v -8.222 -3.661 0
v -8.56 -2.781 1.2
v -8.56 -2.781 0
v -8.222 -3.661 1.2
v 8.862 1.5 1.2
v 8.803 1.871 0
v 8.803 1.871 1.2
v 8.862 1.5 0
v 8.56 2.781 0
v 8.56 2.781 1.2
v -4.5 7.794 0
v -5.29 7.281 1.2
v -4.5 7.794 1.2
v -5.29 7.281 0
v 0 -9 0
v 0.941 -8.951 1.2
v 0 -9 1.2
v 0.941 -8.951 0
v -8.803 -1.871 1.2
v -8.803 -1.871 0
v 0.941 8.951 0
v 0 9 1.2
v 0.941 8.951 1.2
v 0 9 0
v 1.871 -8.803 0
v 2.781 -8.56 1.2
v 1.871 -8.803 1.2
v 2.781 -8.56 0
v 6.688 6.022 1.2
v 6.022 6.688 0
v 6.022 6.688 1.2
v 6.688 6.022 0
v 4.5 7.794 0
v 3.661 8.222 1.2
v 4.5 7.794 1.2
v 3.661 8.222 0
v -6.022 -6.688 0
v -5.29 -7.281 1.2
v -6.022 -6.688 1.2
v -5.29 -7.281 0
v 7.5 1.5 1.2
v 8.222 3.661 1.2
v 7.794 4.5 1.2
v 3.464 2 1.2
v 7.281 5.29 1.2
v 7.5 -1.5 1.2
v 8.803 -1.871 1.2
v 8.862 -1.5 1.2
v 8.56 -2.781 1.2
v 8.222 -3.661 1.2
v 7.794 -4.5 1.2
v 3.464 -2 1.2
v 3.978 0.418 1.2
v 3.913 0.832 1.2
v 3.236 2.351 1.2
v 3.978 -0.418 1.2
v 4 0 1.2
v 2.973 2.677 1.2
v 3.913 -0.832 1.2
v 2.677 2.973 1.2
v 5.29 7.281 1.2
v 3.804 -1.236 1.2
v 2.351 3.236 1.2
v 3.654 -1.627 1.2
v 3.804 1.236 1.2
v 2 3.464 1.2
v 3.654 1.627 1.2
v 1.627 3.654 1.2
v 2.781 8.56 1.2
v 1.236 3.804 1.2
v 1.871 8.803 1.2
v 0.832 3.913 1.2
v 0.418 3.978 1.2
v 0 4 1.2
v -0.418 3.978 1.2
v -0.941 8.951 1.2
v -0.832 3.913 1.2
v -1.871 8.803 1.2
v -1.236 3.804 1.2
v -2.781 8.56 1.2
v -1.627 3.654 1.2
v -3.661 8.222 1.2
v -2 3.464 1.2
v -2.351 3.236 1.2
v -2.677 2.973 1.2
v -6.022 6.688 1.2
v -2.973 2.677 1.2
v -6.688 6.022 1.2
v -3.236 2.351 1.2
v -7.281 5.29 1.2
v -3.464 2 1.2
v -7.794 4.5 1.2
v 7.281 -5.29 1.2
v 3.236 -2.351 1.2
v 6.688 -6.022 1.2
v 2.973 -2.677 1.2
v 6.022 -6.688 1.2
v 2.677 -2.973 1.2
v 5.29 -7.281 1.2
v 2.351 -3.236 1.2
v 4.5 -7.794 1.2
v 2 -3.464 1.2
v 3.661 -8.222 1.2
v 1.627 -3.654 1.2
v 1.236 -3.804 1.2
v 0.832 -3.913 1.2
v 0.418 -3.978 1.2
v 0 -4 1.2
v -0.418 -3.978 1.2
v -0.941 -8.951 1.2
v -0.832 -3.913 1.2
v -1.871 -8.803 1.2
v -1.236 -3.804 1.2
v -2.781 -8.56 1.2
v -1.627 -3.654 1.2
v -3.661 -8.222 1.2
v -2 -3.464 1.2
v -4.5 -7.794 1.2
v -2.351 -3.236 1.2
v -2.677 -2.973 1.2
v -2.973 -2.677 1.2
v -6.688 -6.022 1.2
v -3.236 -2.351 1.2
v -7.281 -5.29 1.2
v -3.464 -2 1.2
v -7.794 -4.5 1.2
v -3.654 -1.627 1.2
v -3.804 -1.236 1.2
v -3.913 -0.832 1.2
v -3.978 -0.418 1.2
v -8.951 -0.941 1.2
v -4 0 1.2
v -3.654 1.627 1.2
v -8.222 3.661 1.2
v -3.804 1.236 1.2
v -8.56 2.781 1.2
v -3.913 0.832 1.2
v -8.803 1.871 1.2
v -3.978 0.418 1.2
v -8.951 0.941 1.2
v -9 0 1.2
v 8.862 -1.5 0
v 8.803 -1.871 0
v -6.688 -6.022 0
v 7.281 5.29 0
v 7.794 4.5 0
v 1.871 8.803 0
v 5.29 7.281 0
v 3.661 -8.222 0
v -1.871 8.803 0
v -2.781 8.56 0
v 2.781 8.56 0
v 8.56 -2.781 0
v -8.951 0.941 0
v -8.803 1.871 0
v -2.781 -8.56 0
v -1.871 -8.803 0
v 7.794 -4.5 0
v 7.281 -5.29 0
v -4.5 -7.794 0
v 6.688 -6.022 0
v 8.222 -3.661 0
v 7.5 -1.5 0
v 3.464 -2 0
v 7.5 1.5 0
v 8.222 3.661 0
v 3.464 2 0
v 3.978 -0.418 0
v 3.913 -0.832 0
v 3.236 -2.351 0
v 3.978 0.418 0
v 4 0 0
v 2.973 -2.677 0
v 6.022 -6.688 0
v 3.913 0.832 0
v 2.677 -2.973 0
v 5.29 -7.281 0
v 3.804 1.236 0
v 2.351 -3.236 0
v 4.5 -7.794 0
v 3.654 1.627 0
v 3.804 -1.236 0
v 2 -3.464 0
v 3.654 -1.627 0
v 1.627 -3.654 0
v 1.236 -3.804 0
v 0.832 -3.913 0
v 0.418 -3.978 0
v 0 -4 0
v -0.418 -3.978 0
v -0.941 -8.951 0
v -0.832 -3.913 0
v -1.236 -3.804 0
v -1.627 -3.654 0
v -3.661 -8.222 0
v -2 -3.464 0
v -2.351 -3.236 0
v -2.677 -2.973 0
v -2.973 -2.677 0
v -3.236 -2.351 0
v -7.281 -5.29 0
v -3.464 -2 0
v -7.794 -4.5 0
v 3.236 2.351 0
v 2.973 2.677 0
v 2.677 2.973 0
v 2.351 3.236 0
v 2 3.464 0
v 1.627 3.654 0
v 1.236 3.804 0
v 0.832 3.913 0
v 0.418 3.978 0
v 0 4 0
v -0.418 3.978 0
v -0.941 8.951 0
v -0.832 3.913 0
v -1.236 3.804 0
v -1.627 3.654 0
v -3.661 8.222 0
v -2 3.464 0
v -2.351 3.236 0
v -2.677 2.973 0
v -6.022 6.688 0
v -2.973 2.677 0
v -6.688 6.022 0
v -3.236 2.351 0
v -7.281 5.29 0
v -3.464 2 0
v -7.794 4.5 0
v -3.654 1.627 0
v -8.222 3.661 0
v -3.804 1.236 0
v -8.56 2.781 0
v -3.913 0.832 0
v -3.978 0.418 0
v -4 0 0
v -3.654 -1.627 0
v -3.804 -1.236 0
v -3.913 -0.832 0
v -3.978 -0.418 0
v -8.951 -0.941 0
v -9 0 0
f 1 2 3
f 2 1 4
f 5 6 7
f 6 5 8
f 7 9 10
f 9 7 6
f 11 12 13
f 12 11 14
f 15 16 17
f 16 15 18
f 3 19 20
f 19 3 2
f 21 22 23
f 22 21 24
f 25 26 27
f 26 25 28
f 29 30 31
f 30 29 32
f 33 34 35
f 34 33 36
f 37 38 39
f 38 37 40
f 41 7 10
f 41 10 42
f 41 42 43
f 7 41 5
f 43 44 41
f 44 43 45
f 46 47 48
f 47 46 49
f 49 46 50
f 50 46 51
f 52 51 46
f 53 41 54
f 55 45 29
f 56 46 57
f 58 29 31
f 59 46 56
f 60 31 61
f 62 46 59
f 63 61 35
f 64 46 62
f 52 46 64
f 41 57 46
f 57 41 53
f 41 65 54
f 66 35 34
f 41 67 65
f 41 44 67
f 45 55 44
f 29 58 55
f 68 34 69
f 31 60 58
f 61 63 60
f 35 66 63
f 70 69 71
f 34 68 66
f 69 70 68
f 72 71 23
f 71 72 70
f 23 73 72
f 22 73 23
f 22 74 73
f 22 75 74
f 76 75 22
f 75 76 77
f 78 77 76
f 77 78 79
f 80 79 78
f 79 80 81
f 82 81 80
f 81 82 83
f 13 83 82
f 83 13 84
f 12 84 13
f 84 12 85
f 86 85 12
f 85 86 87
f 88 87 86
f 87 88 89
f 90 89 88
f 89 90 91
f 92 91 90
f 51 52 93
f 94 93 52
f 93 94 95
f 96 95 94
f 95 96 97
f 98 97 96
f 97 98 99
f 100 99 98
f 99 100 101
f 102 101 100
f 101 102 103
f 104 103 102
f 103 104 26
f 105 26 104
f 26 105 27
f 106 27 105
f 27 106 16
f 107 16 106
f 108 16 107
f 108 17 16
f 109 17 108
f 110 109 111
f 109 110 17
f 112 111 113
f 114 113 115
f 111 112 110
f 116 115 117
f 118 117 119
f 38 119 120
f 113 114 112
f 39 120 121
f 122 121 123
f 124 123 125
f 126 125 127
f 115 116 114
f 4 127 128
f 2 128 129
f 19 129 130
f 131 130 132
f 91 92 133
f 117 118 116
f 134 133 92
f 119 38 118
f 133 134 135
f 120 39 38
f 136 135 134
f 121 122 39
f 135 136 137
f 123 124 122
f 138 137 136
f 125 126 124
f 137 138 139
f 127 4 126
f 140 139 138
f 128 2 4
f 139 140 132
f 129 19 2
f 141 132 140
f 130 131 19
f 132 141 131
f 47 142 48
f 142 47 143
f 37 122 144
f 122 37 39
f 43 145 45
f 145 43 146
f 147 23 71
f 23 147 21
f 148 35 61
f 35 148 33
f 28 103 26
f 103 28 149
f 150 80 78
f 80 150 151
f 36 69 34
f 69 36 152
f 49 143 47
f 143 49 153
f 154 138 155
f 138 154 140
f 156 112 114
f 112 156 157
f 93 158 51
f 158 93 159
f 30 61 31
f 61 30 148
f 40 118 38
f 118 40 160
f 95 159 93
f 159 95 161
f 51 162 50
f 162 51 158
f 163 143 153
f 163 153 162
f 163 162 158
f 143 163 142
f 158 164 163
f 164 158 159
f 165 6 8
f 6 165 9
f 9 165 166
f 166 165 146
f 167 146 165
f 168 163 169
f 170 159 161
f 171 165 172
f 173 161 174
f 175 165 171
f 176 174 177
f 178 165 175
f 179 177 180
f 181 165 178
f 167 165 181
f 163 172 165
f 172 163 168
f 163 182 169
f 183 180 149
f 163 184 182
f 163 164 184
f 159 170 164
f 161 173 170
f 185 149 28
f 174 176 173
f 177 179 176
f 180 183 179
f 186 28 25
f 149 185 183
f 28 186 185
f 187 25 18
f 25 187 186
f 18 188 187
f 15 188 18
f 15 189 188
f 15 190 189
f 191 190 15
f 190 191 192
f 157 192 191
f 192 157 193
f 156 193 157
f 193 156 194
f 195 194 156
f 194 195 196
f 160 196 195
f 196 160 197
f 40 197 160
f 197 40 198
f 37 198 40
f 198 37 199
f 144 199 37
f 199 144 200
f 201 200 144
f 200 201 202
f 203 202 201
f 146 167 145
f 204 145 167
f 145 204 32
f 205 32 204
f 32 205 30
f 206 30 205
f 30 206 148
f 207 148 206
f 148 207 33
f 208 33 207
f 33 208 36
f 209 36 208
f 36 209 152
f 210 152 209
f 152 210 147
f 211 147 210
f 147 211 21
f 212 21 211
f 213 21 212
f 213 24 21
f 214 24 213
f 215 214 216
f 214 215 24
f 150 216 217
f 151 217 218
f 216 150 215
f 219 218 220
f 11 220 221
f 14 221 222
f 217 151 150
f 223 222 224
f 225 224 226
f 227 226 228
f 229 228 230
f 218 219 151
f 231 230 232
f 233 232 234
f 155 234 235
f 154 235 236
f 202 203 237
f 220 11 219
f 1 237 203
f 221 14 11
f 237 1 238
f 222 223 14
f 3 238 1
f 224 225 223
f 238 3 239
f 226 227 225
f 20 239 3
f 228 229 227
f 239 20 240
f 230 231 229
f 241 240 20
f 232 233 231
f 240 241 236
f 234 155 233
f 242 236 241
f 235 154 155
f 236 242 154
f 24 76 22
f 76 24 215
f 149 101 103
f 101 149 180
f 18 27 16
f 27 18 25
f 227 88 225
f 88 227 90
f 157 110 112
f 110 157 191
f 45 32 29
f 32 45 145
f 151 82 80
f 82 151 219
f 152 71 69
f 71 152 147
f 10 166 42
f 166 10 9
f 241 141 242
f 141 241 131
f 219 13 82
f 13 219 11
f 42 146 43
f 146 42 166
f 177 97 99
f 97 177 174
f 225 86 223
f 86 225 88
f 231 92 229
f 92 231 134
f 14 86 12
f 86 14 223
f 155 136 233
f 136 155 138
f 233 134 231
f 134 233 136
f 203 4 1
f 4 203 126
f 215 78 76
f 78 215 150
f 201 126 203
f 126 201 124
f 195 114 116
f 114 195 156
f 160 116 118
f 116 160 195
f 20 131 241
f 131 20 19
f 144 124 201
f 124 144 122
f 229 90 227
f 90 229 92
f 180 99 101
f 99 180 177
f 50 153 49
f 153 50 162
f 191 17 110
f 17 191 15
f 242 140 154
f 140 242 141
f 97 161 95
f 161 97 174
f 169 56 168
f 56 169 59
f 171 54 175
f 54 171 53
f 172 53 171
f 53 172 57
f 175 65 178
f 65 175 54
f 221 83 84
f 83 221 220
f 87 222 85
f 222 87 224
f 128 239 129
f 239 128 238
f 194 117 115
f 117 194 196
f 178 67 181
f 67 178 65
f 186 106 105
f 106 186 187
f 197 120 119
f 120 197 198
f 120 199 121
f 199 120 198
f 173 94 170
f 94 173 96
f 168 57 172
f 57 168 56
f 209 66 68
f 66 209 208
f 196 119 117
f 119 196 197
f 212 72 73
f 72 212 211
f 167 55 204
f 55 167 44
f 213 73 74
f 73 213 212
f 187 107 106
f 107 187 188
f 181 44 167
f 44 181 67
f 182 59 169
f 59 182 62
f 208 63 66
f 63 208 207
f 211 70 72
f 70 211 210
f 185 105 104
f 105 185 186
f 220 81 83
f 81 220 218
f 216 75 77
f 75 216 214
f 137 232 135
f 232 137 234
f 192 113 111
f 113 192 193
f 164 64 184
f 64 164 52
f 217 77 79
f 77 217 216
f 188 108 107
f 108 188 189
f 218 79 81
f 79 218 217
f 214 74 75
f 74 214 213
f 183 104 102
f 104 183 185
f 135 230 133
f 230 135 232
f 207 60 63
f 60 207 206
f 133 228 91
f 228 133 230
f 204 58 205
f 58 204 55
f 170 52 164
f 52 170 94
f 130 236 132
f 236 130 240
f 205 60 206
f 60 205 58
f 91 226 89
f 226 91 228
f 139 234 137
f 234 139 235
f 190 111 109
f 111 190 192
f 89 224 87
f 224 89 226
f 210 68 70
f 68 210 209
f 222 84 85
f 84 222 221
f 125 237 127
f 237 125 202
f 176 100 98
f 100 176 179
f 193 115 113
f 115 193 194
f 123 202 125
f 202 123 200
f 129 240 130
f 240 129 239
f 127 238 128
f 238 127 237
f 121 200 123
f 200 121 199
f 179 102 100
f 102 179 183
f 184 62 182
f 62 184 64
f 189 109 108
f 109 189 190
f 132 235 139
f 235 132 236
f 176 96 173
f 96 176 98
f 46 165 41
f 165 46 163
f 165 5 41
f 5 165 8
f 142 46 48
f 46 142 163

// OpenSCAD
// External retaining ring with installation gap.
$fn = 60;
eps = 0.02;
shaft_d = 8;
outer_d = 18;
thickness = 1.2;
gap = 3;
difference() {
    cylinder(d = outer_d, h = thickness);
    translate([0, 0, -eps]) cylinder(d = shaft_d, h = thickness + 2 * eps);
    translate([outer_d / 2 - gap / 2, -gap / 2, -eps]) cube([gap + eps, gap, thickness + 2 * eps]);
}
